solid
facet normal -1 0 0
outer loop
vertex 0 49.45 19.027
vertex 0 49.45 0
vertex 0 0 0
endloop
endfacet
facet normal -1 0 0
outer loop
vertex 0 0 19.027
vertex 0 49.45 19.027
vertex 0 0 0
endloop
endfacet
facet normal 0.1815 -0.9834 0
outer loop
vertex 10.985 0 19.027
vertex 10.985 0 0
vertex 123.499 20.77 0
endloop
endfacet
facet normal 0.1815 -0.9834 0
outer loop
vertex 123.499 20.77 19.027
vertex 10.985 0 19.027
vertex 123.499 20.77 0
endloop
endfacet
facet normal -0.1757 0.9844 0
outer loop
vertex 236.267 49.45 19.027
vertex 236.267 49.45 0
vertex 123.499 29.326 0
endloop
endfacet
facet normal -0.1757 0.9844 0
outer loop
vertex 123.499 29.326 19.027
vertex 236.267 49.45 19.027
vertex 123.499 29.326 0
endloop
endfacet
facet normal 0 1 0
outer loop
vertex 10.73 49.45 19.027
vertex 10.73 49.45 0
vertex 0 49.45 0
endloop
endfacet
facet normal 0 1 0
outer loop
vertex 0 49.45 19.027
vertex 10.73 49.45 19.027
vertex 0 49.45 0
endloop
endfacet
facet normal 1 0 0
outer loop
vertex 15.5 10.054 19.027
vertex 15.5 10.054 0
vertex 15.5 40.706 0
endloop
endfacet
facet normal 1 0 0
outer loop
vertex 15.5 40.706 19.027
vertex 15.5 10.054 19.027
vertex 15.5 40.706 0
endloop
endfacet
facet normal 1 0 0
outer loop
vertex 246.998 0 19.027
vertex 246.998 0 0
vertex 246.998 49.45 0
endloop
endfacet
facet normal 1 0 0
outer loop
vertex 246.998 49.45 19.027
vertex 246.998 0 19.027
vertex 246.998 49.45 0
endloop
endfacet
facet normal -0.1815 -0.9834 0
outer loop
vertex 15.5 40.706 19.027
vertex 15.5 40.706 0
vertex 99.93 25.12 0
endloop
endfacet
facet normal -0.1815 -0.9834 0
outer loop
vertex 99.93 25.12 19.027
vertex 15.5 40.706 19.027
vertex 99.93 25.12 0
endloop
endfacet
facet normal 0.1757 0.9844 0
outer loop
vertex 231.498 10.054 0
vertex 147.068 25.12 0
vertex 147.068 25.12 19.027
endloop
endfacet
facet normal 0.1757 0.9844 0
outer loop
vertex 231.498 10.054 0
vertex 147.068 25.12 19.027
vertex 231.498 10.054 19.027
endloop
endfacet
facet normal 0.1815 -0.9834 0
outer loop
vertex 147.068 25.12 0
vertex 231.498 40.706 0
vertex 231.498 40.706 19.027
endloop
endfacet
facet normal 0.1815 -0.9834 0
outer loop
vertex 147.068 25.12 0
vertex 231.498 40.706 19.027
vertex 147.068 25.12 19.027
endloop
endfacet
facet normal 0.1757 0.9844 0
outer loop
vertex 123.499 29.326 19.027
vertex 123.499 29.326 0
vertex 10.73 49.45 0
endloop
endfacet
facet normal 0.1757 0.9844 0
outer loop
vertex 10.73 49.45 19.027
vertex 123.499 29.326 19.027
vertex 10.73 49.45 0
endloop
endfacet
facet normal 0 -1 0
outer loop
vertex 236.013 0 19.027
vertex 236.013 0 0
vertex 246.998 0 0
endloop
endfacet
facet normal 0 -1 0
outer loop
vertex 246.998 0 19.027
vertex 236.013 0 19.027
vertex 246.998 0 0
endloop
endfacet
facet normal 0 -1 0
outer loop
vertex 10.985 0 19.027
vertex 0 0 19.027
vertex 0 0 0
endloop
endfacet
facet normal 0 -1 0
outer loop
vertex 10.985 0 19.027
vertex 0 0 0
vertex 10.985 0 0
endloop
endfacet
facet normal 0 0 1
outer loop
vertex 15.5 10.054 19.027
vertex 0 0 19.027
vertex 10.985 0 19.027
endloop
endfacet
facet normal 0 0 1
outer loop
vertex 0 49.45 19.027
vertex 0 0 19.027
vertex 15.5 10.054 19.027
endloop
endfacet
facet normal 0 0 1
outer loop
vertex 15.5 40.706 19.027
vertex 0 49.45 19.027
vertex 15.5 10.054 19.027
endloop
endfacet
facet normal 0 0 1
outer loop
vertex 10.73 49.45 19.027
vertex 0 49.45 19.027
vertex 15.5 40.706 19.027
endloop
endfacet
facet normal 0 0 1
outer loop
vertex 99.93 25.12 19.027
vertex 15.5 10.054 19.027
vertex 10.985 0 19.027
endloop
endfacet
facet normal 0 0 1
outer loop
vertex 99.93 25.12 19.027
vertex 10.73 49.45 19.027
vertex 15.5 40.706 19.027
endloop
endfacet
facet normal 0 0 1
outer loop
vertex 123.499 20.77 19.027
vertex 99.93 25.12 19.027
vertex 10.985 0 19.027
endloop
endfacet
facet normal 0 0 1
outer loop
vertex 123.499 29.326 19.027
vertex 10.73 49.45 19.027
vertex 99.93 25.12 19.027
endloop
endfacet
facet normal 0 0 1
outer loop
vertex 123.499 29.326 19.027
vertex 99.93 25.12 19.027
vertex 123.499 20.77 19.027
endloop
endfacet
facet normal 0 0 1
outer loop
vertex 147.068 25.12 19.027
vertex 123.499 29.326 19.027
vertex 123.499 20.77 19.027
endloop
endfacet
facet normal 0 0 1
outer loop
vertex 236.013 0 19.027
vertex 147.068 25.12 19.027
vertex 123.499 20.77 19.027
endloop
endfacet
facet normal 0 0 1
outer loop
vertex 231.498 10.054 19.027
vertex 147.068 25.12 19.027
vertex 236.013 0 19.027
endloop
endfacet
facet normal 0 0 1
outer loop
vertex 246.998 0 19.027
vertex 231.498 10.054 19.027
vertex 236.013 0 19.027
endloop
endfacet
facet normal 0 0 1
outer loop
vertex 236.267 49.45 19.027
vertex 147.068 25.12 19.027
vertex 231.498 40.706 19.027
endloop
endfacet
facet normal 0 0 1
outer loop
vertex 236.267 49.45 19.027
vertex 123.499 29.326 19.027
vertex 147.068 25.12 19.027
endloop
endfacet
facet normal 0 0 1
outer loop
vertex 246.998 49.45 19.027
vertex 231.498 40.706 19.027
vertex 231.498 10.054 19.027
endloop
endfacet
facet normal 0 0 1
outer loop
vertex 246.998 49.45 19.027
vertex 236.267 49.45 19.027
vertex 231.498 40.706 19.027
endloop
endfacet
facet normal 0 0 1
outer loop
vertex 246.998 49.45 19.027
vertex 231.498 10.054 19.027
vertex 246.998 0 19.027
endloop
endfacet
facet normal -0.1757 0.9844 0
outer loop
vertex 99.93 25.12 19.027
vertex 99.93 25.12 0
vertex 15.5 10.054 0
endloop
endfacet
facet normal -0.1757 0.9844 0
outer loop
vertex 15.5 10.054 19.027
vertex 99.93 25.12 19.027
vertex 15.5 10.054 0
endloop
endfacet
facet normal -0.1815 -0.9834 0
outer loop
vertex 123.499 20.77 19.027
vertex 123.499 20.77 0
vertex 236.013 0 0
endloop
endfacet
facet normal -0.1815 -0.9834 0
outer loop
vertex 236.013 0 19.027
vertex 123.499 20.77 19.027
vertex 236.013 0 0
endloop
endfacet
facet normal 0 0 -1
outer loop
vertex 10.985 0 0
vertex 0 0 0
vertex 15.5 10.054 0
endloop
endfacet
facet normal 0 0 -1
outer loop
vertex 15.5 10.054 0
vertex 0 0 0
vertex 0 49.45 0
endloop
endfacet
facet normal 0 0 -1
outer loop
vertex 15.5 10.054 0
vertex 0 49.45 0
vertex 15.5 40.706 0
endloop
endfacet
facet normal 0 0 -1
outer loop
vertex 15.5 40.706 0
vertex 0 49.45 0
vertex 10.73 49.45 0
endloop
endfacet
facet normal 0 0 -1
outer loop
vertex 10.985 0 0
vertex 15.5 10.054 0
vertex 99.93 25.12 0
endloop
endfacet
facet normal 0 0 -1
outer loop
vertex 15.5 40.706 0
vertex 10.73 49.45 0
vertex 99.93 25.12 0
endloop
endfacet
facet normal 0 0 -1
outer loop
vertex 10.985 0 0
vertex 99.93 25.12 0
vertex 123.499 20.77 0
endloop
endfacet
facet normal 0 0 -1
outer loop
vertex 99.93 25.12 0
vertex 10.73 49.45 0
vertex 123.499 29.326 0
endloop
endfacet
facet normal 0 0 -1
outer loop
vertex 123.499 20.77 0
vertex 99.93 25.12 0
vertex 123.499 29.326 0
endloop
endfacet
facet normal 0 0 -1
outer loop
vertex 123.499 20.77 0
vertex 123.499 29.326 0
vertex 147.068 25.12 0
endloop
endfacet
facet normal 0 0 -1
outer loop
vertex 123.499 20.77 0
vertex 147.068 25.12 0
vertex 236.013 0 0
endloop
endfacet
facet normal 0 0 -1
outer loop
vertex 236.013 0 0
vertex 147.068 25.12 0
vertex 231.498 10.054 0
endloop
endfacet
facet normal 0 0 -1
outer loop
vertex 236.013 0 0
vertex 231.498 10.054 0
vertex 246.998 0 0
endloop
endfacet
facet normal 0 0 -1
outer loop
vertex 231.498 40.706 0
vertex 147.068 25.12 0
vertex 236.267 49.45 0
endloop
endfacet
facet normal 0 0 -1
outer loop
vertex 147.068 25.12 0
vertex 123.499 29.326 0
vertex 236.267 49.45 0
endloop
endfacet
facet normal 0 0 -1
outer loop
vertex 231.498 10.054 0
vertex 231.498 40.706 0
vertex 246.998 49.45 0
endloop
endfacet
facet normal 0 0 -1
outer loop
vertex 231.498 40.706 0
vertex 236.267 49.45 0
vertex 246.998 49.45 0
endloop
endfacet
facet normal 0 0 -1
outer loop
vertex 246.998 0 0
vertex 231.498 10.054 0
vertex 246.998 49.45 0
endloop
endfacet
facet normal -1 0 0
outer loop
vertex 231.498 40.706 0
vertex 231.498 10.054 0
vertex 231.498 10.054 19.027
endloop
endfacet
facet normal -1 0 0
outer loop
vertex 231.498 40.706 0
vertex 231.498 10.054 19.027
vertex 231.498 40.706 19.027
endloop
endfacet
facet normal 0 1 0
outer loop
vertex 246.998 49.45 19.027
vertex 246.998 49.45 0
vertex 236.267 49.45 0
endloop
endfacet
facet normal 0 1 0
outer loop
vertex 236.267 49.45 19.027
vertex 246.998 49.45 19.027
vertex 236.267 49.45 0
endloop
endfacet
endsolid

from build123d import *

# Parameters (mm, degrees)
BOSS_EXTRUDE1_DEPTH = 19.0272625


with BuildPart() as part:
    # Sketch1 → Boss-Extrude1 (new body)
    with BuildSketch(Plane.XY):
        Polygon((0, 0), (10.985406775, 0), (123.4989795, 20.769522906), (236.012552225, 0), (246.997959, 0), (246.997959, 49.45), (236.267497729, 49.45), (123.4989795, 29.326227234), (10.730461271, 49.45), (0, 49.45), align=None)
        Polygon((15.5, 40.705671267), (99.929892015, 25.120275357), (15.5, 10.053588411), align=None, mode=Mode.SUBTRACT)
        Polygon((231.497959, 40.705671267), (147.068066985, 25.120275357), (231.497959, 10.053588411), align=None, mode=Mode.SUBTRACT)
    extrude(amount=BOSS_EXTRUDE1_DEPTH)


solid = part.part
